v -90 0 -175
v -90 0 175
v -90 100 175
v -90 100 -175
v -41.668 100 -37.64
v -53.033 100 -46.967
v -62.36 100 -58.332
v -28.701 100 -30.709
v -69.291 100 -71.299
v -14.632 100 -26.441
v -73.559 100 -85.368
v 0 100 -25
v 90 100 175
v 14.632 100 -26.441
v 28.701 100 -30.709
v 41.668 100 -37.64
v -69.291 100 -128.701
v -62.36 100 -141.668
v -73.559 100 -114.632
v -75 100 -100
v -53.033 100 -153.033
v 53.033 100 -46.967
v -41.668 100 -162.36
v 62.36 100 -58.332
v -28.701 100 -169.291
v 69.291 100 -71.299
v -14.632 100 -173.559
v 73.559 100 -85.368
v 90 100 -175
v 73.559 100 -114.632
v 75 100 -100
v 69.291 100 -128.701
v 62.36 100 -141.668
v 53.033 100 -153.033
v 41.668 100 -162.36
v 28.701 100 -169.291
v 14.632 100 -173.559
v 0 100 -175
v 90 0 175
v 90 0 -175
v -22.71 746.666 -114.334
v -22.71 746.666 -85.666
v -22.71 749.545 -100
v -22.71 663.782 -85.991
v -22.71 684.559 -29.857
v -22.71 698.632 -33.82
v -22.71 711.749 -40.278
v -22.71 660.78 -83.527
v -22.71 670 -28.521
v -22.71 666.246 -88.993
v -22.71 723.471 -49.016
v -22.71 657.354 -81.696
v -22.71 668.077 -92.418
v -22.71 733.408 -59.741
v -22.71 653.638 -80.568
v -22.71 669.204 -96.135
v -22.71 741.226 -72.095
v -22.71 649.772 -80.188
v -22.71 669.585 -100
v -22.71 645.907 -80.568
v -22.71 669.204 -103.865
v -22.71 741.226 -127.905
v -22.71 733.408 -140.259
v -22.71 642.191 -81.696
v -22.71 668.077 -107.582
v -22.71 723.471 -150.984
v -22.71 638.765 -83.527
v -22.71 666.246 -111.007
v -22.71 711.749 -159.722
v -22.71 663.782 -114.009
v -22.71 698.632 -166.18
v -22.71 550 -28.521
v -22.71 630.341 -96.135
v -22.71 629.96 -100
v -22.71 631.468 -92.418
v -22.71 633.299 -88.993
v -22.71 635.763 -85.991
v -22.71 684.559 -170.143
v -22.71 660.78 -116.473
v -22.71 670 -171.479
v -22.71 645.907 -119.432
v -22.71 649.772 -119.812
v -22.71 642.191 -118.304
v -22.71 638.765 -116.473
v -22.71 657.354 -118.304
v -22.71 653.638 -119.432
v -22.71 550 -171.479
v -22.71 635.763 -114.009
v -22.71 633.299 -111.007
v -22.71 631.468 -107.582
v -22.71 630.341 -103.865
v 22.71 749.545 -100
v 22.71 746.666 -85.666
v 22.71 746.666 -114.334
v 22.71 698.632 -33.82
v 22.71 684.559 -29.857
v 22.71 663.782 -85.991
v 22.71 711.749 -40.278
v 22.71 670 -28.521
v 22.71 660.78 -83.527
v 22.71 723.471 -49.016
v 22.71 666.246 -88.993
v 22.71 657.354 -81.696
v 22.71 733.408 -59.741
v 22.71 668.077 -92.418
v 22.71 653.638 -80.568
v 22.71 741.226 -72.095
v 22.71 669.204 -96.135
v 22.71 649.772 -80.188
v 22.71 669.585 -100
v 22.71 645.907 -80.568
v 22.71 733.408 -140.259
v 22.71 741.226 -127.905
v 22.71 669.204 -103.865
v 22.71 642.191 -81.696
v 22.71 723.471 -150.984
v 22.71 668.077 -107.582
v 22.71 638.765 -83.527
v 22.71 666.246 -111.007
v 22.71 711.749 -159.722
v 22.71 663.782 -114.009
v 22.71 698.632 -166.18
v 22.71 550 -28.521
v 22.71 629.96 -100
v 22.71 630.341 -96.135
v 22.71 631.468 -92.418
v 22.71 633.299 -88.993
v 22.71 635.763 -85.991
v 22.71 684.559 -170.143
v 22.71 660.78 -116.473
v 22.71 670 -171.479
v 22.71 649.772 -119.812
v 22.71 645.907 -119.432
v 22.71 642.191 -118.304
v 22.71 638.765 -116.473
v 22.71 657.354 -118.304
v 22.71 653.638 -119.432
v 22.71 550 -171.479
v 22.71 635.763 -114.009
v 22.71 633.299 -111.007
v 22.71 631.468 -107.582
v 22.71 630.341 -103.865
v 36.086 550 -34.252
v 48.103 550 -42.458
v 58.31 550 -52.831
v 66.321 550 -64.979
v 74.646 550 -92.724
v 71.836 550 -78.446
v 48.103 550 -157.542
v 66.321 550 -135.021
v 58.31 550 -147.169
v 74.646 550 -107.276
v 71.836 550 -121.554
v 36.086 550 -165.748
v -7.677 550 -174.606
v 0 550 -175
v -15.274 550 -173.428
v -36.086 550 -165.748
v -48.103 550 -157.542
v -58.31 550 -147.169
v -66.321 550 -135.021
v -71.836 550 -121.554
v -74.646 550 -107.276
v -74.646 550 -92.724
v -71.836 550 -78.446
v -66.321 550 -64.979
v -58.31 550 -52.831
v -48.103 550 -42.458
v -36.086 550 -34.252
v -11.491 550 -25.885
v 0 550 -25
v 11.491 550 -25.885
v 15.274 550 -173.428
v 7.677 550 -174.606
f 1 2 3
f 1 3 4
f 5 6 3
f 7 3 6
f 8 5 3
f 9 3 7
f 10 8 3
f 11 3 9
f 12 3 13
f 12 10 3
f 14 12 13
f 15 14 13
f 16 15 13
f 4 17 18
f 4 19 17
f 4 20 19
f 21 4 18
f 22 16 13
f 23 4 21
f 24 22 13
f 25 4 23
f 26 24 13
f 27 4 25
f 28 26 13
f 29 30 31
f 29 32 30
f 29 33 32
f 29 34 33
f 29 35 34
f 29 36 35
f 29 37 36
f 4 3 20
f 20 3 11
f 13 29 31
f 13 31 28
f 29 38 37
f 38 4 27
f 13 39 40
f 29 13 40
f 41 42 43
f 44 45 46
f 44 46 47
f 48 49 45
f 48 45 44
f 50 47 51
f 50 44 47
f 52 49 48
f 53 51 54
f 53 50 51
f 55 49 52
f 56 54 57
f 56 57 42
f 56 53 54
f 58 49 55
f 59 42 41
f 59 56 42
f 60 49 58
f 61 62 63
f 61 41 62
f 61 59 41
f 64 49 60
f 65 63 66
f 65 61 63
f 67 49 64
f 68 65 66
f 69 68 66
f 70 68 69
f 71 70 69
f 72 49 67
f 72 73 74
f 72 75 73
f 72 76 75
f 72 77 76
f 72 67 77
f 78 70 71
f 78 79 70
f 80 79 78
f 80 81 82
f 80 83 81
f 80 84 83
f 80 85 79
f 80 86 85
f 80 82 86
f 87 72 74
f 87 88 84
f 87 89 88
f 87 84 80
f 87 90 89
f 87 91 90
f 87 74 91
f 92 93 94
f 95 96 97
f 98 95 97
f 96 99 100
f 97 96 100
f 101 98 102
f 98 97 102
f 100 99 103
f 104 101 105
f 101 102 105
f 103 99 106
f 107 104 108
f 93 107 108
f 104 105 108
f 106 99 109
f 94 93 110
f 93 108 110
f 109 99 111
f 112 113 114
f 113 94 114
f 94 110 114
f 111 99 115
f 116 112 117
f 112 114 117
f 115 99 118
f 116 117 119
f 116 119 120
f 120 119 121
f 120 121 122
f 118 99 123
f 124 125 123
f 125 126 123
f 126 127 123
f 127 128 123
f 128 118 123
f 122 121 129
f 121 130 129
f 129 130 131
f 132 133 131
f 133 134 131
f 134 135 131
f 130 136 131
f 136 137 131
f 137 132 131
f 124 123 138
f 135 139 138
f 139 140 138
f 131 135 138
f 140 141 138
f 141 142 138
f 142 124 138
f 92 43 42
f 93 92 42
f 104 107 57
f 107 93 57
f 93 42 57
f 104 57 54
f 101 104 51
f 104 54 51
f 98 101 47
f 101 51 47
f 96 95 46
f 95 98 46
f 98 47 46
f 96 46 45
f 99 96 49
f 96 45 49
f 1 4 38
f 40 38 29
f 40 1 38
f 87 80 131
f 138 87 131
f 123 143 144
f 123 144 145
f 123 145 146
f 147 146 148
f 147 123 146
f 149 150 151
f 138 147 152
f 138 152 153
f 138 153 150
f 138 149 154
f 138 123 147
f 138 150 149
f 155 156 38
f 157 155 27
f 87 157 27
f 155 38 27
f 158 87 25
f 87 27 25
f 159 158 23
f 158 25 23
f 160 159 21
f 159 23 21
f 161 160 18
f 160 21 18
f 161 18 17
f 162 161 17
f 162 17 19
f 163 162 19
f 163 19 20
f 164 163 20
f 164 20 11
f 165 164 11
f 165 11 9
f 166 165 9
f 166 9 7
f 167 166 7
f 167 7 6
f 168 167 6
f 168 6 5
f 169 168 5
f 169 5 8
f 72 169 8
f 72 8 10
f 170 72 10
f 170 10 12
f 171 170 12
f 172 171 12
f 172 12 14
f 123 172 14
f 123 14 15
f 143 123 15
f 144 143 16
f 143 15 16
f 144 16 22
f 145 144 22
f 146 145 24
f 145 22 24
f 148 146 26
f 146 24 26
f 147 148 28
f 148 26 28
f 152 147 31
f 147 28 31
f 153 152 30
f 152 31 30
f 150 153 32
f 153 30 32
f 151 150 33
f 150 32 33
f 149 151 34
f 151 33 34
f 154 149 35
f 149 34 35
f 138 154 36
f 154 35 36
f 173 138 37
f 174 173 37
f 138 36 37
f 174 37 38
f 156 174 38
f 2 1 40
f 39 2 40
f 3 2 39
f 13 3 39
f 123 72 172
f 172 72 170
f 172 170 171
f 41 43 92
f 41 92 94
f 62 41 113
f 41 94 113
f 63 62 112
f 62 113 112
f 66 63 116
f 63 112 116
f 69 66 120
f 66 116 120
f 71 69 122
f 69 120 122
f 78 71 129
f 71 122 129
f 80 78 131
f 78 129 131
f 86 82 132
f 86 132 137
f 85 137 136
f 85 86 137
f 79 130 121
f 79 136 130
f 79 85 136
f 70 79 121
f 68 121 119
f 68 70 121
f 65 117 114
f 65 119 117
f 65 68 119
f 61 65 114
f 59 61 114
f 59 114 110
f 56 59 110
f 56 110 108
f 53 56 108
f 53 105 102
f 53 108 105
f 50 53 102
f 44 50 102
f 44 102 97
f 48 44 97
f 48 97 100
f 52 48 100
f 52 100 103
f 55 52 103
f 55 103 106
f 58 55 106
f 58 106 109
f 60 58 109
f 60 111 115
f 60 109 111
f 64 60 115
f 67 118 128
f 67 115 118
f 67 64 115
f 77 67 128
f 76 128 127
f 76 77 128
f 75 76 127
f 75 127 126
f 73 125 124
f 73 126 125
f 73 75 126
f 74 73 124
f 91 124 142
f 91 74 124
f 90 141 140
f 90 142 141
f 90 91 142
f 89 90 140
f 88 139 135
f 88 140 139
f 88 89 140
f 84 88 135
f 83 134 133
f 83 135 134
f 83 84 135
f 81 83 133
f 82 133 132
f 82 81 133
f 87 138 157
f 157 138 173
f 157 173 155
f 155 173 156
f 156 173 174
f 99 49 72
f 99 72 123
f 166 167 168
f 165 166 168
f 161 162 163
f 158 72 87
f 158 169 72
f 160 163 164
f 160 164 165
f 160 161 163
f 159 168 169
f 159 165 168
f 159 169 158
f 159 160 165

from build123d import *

# Parameters (mm, degrees)
SKETCH1_W               = 180
SKETCH1_H               = 350
BOSS_EXTRUDE1_DEPTH     = 100
SKETCH2_R               = 75
BOSS_EXTRUDE2_DEPTH     = 450
SKETCH3_W               = 45.419423784
SKETCH3_H               = 142.958301414
BOSS_EXTRUDE3_DEPTH     = 200
FILLET1_R               = 80
CUT_EXTRUDE1_DEPTH      = 778.911353606
CUT_EXTRUDE1_DEPTH_BACK = 778.911353606
SKETCH4_R               = 19.812422485


with BuildPart() as part:
    # Sketch1 → Boss-Extrude1 (new body)
    with BuildSketch(Plane(origin=(0, 0, 0), x_dir=(1, 0, 0), z_dir=(0, 1, 0))):
        Rectangle(SKETCH1_W, SKETCH1_H)
    extrude(amount=BOSS_EXTRUDE1_DEPTH)

    # Sketch2 → Boss-Extrude2 (add)
    with BuildSketch(Plane(origin=(0, 100, 0), x_dir=(1, 0, 0), z_dir=(0, 1, 0))):
        with Locations(Location((0, 100, 0), (0, 0, 90))):
            Circle(SKETCH2_R)
    extrude(amount=BOSS_EXTRUDE2_DEPTH)

    # Sketch3 → Boss-Extrude3 (add)
    with BuildSketch(Plane(origin=(0, 550, 0), x_dir=(1, 0, 0), z_dir=(0, 1, 0))):
        with Locations((0, 100)):
            Rectangle(SKETCH3_W, SKETCH3_H)
    extrude(amount=BOSS_EXTRUDE3_DEPTH)

    # Fillet1
    # the kernel refuses this fillet: 80 mm, written as the material it takes off along each edge
    with BuildSketch(Plane(origin=(222.709711892, 750, -171.479150707), x_dir=(0, -1, 0), z_dir=(-1, 0, 0)), Plane(origin=(-222.709711892, 750, -28.520849293), x_dir=(0, -1, 0), z_dir=(1, 0, 0))) as fillet1_piece_1:
        with BuildLine():
            CenterArc((FILLET1_R, FILLET1_R), FILLET1_R, 180, 90)
            Line((0, FILLET1_R), (0, 0))
            Line((0, 0), (FILLET1_R, 0))
        make_face()
    extrude(amount=445.419423783, mode=Mode.SUBTRACT)

    # Sketch4 → Cut-Extrude1 (cut, two sides: drawn at the far end of the back side and taken through both)
    with BuildSketch(Plane(origin=(-22.709711892, 0, 0), x_dir=(0, 0, -1), z_dir=(1, 0, 0)).offset(-CUT_EXTRUDE1_DEPTH_BACK)):
        with Locations((100, 649.772462607)):
            Circle(SKETCH4_R)
    extrude(amount=CUT_EXTRUDE1_DEPTH + CUT_EXTRUDE1_DEPTH_BACK, mode=Mode.SUBTRACT)


solid = part.part
